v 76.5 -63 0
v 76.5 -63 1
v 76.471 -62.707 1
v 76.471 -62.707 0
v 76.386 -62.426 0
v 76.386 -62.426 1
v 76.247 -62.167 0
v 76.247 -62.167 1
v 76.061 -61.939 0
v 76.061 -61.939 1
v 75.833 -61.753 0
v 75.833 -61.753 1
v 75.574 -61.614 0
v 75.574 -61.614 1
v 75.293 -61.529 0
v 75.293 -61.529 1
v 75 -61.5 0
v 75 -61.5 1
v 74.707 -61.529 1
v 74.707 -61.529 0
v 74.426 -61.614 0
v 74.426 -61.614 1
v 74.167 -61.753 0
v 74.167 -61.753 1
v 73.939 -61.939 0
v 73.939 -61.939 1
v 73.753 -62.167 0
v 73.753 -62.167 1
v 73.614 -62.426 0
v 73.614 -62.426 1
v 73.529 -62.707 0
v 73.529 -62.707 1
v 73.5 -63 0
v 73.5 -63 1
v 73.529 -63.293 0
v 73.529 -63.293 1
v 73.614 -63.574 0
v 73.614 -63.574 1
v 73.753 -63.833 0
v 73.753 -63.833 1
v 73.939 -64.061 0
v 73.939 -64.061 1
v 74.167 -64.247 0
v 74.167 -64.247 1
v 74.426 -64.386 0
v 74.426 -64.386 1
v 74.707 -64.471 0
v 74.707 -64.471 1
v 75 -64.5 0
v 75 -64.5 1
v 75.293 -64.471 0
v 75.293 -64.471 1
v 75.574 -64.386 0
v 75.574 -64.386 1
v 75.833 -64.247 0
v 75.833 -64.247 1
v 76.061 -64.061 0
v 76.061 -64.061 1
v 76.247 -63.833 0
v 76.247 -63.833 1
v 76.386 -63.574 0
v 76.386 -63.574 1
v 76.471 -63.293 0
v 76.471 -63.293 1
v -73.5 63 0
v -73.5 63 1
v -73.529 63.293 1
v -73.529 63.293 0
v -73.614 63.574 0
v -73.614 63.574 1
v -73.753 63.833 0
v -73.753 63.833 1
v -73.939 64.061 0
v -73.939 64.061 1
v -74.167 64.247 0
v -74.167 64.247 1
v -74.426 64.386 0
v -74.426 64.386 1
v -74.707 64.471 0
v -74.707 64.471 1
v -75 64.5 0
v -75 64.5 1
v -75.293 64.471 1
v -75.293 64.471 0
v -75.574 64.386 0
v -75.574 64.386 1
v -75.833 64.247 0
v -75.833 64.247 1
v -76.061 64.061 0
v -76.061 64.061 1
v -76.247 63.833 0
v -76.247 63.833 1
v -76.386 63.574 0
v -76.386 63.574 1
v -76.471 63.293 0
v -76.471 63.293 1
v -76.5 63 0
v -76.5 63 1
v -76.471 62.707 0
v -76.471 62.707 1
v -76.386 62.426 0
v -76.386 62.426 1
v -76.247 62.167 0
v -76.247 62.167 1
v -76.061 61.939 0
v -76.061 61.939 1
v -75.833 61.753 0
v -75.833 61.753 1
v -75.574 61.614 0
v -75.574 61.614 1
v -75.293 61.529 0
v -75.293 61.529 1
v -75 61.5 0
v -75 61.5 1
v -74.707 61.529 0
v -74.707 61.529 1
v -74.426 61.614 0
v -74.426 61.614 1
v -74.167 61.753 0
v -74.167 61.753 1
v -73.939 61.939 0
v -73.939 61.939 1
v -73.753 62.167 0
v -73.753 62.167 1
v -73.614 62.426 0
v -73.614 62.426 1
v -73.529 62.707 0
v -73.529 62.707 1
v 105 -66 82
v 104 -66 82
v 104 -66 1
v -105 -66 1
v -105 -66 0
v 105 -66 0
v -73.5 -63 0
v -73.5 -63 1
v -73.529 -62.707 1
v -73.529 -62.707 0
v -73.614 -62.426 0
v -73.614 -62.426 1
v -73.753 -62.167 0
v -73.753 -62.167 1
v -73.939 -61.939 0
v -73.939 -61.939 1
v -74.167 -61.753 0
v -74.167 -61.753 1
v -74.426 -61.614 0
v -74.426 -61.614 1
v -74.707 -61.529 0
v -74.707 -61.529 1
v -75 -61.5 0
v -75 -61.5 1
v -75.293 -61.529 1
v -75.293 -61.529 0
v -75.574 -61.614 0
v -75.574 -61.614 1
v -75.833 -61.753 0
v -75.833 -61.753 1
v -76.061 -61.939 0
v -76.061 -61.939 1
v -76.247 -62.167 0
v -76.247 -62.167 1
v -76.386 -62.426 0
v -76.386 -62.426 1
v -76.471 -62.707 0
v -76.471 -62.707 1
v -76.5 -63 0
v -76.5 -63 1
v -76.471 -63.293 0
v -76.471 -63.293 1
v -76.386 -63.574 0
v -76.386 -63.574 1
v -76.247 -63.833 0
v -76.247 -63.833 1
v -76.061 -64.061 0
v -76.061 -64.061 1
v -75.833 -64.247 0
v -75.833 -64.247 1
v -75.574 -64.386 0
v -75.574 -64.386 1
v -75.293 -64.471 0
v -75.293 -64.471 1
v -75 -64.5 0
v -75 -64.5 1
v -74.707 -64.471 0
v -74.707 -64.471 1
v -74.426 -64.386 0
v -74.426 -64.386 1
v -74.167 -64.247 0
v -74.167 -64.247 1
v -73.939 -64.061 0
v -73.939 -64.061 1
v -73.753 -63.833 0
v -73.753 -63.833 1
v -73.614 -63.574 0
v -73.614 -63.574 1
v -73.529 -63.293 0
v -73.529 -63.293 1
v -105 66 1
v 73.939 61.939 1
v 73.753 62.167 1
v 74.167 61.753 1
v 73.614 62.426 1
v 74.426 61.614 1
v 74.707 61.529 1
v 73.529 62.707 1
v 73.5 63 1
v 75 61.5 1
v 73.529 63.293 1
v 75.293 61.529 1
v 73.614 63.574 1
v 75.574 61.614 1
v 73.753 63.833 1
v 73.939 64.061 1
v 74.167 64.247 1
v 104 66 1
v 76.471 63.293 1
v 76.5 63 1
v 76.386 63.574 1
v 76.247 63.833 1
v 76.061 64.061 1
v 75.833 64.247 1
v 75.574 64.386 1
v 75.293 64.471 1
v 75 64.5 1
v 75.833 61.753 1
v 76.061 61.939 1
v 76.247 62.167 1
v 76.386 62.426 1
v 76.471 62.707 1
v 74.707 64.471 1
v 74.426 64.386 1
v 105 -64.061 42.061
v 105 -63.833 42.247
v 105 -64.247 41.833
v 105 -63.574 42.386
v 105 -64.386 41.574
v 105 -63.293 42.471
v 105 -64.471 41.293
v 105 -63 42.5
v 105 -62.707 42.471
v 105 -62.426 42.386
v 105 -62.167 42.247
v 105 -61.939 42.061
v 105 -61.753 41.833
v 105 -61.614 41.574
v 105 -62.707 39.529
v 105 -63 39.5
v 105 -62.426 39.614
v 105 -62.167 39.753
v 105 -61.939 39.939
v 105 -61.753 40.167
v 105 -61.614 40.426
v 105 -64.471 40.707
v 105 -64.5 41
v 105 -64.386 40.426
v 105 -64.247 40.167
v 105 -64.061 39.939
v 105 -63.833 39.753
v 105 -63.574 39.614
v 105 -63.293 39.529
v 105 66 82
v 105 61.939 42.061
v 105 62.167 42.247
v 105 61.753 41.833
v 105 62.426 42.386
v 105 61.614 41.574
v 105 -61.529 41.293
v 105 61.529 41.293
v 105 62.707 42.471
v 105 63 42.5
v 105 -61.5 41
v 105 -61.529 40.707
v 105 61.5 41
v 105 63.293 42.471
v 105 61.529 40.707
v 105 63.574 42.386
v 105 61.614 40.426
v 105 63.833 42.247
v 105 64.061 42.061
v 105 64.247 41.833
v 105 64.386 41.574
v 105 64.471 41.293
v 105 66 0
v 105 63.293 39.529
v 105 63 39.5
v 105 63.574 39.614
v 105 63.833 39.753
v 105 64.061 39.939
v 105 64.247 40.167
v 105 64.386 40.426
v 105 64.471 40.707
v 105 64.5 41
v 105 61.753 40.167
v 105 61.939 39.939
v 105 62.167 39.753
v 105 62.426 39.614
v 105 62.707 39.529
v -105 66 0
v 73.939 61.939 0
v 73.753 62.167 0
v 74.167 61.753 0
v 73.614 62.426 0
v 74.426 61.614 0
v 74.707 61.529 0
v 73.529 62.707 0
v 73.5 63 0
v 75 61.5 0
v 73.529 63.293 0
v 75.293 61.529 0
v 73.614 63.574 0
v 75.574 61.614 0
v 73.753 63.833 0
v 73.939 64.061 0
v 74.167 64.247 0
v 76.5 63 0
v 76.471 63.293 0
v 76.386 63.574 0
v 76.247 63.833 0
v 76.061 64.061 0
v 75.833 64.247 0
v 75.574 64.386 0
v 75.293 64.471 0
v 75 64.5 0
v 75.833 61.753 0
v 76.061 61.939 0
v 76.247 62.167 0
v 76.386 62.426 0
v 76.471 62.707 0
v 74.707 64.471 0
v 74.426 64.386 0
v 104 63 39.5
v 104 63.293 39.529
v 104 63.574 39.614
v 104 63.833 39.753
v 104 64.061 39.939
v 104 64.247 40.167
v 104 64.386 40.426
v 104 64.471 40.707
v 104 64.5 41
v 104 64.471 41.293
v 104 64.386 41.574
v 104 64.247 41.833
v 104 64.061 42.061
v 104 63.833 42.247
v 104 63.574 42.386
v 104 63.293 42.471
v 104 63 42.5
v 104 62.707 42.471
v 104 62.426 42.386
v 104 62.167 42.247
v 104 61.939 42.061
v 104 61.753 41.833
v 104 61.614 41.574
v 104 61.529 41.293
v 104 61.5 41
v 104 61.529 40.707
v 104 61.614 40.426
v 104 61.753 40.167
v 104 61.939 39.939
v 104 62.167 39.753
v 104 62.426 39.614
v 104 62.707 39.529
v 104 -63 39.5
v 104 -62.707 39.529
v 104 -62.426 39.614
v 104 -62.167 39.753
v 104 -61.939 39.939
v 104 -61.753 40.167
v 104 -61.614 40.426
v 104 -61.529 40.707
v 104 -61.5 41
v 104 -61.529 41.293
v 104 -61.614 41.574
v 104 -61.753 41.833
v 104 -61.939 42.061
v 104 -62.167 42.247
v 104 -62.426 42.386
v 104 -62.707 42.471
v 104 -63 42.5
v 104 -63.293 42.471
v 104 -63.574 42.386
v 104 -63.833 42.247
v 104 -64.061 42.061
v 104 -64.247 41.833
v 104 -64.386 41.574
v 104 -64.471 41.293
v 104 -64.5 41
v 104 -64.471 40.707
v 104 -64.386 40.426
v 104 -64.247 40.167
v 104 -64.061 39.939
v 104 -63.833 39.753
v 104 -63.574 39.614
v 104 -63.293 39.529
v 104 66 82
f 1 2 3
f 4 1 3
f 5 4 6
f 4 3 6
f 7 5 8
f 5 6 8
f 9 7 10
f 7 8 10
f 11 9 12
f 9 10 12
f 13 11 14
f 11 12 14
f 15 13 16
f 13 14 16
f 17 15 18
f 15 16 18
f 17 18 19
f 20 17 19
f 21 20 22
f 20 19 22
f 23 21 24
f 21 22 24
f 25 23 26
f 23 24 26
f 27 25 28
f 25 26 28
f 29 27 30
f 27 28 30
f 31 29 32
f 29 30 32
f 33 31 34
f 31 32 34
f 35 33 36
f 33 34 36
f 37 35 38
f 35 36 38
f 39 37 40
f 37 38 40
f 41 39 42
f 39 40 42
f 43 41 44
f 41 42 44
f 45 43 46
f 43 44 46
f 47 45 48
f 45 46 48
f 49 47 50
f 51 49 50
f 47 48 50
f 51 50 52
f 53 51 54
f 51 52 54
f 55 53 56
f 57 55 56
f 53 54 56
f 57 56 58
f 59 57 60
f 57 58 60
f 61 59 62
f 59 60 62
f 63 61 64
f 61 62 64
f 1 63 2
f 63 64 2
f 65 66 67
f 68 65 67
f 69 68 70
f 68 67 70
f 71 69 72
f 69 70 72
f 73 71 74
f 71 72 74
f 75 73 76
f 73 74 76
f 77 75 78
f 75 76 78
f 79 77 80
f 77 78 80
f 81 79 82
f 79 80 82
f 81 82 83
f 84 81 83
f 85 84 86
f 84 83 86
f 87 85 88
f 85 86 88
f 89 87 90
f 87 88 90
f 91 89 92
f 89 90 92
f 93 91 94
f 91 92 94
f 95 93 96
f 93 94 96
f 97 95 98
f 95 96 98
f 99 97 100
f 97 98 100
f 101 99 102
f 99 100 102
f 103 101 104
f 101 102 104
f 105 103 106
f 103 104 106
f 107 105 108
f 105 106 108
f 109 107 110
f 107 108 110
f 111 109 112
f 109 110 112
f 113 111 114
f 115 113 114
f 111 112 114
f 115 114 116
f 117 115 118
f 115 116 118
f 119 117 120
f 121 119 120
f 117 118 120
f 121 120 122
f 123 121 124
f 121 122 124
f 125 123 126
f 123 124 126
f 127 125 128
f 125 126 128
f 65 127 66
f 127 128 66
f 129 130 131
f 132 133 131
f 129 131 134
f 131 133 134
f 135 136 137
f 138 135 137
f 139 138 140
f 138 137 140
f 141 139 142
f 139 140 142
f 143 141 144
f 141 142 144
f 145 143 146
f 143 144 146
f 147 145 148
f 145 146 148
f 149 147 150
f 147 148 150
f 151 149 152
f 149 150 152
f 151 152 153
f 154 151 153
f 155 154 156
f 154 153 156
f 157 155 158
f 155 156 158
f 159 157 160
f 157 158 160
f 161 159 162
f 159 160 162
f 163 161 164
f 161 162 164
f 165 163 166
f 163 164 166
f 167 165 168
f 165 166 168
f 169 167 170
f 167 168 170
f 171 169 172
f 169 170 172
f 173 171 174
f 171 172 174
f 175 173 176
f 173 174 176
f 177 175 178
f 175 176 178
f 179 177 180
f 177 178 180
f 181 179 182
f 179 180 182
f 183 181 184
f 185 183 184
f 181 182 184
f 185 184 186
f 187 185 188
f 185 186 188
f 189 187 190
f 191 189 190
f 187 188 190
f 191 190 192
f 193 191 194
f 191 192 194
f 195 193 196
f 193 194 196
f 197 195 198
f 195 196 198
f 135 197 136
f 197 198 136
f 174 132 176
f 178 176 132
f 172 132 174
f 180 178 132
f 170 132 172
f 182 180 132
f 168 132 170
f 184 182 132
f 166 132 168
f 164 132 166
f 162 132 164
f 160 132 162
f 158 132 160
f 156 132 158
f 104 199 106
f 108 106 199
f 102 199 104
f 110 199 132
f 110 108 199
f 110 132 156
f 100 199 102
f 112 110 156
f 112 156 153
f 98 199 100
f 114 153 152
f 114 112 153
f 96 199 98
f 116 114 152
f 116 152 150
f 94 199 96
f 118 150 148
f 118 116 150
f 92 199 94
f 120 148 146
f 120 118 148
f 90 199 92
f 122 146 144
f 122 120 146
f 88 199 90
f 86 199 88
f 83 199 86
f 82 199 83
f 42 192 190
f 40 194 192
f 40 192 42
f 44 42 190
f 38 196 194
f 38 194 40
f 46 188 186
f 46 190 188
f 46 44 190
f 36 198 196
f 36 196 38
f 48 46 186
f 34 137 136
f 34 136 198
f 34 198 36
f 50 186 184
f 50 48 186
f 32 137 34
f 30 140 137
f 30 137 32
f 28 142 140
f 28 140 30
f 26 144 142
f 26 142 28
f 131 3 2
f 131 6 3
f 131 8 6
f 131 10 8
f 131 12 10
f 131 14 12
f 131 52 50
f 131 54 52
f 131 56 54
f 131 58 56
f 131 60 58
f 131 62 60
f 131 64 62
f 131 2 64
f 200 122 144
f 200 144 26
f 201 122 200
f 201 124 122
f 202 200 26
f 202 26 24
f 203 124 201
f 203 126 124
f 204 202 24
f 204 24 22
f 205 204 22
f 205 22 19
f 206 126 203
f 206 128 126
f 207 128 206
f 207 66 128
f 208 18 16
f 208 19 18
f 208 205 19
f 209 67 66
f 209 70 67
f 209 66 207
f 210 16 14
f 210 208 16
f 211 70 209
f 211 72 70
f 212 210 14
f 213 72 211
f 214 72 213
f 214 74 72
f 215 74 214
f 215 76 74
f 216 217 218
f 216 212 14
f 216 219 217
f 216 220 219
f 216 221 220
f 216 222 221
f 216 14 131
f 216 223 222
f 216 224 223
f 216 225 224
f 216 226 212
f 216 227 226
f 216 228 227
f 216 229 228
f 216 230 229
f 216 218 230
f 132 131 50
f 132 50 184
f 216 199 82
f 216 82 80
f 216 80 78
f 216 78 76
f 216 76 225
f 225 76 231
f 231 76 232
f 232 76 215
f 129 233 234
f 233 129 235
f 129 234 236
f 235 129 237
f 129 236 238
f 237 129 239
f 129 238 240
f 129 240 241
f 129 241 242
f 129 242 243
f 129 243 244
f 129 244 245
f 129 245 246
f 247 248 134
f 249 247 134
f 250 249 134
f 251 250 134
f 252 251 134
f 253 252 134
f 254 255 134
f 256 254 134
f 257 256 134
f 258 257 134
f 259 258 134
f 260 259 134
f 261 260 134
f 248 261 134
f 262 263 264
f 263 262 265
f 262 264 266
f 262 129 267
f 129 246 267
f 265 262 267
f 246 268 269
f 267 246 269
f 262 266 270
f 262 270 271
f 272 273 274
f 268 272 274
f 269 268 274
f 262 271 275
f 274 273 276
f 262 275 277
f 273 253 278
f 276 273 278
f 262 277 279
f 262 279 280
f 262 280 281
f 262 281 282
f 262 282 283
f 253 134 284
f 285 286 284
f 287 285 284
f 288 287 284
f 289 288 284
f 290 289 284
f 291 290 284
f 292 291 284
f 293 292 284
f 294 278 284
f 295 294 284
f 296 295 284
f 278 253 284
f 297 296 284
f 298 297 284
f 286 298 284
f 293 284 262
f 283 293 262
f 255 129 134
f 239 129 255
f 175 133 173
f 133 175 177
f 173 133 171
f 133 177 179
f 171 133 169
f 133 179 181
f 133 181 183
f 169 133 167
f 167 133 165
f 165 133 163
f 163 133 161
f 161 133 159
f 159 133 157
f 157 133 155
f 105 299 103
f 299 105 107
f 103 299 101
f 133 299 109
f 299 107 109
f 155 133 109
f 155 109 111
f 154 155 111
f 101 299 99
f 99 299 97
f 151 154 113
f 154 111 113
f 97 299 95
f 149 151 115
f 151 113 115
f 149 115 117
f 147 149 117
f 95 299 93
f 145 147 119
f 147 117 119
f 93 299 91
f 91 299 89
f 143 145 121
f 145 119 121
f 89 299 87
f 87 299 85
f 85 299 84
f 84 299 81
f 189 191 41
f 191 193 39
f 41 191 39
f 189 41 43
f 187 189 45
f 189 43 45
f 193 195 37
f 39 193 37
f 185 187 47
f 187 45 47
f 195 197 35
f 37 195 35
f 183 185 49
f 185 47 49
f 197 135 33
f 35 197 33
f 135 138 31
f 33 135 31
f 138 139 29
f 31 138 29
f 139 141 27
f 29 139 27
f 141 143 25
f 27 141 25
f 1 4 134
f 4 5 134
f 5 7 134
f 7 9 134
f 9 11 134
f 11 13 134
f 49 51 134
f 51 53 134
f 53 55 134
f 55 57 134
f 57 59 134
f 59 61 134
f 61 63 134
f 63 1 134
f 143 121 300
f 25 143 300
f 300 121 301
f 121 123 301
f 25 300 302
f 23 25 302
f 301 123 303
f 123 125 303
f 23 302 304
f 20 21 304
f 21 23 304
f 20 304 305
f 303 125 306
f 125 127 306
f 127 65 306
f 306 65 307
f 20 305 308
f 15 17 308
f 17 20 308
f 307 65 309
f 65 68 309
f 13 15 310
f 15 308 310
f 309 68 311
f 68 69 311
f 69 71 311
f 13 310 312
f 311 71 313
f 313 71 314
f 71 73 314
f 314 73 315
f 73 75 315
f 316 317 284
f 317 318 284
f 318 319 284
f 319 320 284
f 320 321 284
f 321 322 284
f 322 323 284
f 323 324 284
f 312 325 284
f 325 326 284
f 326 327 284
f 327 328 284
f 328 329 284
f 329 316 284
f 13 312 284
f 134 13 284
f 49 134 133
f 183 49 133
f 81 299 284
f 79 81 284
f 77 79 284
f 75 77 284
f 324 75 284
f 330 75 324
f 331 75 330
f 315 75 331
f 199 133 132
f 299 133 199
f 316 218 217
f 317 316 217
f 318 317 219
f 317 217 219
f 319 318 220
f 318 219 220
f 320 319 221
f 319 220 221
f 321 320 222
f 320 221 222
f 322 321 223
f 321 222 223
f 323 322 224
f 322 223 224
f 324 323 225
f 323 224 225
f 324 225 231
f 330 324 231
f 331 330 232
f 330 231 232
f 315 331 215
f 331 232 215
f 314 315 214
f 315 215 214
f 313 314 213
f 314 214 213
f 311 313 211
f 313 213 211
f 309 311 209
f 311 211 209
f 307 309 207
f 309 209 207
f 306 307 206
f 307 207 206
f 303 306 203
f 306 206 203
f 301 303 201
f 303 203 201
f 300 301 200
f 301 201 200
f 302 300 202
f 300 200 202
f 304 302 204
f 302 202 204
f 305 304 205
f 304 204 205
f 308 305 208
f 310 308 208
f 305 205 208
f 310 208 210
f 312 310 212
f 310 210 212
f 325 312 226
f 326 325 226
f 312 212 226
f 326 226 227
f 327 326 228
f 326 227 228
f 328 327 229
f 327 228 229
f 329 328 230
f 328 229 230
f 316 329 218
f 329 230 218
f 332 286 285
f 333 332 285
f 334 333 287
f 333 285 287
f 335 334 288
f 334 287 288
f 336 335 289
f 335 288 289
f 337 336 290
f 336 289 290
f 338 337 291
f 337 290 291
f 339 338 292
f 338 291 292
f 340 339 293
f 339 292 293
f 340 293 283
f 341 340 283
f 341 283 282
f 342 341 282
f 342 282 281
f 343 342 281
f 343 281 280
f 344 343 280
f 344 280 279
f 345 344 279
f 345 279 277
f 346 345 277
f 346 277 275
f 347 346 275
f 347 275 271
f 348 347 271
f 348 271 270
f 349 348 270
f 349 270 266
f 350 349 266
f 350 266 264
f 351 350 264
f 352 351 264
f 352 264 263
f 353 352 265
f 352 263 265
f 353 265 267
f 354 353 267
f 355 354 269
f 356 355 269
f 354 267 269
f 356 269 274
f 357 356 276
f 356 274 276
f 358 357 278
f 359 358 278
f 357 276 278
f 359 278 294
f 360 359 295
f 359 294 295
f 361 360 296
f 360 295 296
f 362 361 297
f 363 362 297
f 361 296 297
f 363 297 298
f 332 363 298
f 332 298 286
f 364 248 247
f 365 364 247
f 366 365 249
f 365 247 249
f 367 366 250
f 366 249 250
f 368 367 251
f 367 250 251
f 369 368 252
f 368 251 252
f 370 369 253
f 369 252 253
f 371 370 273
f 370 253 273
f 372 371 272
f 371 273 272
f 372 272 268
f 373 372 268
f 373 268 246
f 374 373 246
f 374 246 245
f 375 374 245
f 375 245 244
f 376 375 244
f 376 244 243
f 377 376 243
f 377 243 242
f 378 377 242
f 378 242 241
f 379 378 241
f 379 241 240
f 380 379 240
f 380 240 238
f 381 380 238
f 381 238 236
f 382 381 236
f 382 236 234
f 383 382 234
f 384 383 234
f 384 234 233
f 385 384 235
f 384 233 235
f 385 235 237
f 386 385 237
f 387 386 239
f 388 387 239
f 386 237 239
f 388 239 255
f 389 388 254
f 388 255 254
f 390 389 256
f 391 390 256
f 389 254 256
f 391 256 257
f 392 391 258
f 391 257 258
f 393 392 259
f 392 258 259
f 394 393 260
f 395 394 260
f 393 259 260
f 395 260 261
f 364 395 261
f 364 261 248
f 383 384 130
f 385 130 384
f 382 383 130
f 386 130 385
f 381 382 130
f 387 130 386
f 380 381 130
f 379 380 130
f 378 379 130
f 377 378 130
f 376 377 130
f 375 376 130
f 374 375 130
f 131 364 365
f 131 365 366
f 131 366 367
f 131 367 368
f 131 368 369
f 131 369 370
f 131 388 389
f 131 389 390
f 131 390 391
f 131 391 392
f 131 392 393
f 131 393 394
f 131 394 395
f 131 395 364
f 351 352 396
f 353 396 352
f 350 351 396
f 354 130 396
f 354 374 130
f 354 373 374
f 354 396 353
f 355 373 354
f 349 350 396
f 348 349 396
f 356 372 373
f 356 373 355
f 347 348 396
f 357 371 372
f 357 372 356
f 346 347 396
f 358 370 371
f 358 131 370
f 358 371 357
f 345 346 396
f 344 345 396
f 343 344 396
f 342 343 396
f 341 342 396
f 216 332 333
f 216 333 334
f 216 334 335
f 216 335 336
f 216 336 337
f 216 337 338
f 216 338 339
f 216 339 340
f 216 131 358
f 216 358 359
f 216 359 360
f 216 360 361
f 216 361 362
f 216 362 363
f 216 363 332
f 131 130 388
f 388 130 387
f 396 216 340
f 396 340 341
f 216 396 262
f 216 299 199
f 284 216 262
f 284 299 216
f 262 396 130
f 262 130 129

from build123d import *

# Parameters (mm, degrees)
SKETCH_1_W          = 210
SKETCH_1_H          = 132
EXTRUDE_1_DEPTH     = 1
SKETCH_3_W          = 1
SKETCH_3_H          = 132
EXTRUDE_2_DEPTH     = 81
SKETCH_2_R          = 1.5
CUT_EXTRUDE_1_DEPTH = 1
SKETCH_4_R          = 1.5
CUT_EXTRUDE_2_DEPTH = 211


with BuildPart() as part:
    # 草图1 → 凸台-拉伸1 (new body)
    with BuildSketch(Plane.XY):
        Rectangle(SKETCH_1_W, SKETCH_1_H)
    extrude(amount=EXTRUDE_1_DEPTH)

    # 草图3 → 凸台-拉伸2 (add)
    with BuildSketch(Plane.XY.offset(1)):
        with Locations((104.5, 0)):
            Rectangle(SKETCH_3_W, SKETCH_3_H)
    extrude(amount=EXTRUDE_2_DEPTH)

    # 草图2 → 切除-拉伸1 (cut)
    with BuildSketch(Plane.XY.offset(1)):
        with Locations((-75, 63)):
            Circle(SKETCH_2_R)
        with Locations((75, 63)):
            Circle(SKETCH_2_R)
        with Locations((75, -63)):
            Circle(SKETCH_2_R)
        with Locations((-75, -63)):
            Circle(SKETCH_2_R)
    extrude(amount=-CUT_EXTRUDE_1_DEPTH, mode=Mode.SUBTRACT)

    # 草图4 → 切除-拉伸2 (cut, through all)
    with BuildSketch(Plane(origin=(105, 0, 0), x_dir=(0, 0, -1), z_dir=(1, 0, 0))):
        with Locations((-41, 63)):
            Circle(SKETCH_4_R)
        with Locations((-41, -63)):
            Circle(SKETCH_4_R)
    extrude(amount=-CUT_EXTRUDE_2_DEPTH, mode=Mode.SUBTRACT)


solid = part.part
